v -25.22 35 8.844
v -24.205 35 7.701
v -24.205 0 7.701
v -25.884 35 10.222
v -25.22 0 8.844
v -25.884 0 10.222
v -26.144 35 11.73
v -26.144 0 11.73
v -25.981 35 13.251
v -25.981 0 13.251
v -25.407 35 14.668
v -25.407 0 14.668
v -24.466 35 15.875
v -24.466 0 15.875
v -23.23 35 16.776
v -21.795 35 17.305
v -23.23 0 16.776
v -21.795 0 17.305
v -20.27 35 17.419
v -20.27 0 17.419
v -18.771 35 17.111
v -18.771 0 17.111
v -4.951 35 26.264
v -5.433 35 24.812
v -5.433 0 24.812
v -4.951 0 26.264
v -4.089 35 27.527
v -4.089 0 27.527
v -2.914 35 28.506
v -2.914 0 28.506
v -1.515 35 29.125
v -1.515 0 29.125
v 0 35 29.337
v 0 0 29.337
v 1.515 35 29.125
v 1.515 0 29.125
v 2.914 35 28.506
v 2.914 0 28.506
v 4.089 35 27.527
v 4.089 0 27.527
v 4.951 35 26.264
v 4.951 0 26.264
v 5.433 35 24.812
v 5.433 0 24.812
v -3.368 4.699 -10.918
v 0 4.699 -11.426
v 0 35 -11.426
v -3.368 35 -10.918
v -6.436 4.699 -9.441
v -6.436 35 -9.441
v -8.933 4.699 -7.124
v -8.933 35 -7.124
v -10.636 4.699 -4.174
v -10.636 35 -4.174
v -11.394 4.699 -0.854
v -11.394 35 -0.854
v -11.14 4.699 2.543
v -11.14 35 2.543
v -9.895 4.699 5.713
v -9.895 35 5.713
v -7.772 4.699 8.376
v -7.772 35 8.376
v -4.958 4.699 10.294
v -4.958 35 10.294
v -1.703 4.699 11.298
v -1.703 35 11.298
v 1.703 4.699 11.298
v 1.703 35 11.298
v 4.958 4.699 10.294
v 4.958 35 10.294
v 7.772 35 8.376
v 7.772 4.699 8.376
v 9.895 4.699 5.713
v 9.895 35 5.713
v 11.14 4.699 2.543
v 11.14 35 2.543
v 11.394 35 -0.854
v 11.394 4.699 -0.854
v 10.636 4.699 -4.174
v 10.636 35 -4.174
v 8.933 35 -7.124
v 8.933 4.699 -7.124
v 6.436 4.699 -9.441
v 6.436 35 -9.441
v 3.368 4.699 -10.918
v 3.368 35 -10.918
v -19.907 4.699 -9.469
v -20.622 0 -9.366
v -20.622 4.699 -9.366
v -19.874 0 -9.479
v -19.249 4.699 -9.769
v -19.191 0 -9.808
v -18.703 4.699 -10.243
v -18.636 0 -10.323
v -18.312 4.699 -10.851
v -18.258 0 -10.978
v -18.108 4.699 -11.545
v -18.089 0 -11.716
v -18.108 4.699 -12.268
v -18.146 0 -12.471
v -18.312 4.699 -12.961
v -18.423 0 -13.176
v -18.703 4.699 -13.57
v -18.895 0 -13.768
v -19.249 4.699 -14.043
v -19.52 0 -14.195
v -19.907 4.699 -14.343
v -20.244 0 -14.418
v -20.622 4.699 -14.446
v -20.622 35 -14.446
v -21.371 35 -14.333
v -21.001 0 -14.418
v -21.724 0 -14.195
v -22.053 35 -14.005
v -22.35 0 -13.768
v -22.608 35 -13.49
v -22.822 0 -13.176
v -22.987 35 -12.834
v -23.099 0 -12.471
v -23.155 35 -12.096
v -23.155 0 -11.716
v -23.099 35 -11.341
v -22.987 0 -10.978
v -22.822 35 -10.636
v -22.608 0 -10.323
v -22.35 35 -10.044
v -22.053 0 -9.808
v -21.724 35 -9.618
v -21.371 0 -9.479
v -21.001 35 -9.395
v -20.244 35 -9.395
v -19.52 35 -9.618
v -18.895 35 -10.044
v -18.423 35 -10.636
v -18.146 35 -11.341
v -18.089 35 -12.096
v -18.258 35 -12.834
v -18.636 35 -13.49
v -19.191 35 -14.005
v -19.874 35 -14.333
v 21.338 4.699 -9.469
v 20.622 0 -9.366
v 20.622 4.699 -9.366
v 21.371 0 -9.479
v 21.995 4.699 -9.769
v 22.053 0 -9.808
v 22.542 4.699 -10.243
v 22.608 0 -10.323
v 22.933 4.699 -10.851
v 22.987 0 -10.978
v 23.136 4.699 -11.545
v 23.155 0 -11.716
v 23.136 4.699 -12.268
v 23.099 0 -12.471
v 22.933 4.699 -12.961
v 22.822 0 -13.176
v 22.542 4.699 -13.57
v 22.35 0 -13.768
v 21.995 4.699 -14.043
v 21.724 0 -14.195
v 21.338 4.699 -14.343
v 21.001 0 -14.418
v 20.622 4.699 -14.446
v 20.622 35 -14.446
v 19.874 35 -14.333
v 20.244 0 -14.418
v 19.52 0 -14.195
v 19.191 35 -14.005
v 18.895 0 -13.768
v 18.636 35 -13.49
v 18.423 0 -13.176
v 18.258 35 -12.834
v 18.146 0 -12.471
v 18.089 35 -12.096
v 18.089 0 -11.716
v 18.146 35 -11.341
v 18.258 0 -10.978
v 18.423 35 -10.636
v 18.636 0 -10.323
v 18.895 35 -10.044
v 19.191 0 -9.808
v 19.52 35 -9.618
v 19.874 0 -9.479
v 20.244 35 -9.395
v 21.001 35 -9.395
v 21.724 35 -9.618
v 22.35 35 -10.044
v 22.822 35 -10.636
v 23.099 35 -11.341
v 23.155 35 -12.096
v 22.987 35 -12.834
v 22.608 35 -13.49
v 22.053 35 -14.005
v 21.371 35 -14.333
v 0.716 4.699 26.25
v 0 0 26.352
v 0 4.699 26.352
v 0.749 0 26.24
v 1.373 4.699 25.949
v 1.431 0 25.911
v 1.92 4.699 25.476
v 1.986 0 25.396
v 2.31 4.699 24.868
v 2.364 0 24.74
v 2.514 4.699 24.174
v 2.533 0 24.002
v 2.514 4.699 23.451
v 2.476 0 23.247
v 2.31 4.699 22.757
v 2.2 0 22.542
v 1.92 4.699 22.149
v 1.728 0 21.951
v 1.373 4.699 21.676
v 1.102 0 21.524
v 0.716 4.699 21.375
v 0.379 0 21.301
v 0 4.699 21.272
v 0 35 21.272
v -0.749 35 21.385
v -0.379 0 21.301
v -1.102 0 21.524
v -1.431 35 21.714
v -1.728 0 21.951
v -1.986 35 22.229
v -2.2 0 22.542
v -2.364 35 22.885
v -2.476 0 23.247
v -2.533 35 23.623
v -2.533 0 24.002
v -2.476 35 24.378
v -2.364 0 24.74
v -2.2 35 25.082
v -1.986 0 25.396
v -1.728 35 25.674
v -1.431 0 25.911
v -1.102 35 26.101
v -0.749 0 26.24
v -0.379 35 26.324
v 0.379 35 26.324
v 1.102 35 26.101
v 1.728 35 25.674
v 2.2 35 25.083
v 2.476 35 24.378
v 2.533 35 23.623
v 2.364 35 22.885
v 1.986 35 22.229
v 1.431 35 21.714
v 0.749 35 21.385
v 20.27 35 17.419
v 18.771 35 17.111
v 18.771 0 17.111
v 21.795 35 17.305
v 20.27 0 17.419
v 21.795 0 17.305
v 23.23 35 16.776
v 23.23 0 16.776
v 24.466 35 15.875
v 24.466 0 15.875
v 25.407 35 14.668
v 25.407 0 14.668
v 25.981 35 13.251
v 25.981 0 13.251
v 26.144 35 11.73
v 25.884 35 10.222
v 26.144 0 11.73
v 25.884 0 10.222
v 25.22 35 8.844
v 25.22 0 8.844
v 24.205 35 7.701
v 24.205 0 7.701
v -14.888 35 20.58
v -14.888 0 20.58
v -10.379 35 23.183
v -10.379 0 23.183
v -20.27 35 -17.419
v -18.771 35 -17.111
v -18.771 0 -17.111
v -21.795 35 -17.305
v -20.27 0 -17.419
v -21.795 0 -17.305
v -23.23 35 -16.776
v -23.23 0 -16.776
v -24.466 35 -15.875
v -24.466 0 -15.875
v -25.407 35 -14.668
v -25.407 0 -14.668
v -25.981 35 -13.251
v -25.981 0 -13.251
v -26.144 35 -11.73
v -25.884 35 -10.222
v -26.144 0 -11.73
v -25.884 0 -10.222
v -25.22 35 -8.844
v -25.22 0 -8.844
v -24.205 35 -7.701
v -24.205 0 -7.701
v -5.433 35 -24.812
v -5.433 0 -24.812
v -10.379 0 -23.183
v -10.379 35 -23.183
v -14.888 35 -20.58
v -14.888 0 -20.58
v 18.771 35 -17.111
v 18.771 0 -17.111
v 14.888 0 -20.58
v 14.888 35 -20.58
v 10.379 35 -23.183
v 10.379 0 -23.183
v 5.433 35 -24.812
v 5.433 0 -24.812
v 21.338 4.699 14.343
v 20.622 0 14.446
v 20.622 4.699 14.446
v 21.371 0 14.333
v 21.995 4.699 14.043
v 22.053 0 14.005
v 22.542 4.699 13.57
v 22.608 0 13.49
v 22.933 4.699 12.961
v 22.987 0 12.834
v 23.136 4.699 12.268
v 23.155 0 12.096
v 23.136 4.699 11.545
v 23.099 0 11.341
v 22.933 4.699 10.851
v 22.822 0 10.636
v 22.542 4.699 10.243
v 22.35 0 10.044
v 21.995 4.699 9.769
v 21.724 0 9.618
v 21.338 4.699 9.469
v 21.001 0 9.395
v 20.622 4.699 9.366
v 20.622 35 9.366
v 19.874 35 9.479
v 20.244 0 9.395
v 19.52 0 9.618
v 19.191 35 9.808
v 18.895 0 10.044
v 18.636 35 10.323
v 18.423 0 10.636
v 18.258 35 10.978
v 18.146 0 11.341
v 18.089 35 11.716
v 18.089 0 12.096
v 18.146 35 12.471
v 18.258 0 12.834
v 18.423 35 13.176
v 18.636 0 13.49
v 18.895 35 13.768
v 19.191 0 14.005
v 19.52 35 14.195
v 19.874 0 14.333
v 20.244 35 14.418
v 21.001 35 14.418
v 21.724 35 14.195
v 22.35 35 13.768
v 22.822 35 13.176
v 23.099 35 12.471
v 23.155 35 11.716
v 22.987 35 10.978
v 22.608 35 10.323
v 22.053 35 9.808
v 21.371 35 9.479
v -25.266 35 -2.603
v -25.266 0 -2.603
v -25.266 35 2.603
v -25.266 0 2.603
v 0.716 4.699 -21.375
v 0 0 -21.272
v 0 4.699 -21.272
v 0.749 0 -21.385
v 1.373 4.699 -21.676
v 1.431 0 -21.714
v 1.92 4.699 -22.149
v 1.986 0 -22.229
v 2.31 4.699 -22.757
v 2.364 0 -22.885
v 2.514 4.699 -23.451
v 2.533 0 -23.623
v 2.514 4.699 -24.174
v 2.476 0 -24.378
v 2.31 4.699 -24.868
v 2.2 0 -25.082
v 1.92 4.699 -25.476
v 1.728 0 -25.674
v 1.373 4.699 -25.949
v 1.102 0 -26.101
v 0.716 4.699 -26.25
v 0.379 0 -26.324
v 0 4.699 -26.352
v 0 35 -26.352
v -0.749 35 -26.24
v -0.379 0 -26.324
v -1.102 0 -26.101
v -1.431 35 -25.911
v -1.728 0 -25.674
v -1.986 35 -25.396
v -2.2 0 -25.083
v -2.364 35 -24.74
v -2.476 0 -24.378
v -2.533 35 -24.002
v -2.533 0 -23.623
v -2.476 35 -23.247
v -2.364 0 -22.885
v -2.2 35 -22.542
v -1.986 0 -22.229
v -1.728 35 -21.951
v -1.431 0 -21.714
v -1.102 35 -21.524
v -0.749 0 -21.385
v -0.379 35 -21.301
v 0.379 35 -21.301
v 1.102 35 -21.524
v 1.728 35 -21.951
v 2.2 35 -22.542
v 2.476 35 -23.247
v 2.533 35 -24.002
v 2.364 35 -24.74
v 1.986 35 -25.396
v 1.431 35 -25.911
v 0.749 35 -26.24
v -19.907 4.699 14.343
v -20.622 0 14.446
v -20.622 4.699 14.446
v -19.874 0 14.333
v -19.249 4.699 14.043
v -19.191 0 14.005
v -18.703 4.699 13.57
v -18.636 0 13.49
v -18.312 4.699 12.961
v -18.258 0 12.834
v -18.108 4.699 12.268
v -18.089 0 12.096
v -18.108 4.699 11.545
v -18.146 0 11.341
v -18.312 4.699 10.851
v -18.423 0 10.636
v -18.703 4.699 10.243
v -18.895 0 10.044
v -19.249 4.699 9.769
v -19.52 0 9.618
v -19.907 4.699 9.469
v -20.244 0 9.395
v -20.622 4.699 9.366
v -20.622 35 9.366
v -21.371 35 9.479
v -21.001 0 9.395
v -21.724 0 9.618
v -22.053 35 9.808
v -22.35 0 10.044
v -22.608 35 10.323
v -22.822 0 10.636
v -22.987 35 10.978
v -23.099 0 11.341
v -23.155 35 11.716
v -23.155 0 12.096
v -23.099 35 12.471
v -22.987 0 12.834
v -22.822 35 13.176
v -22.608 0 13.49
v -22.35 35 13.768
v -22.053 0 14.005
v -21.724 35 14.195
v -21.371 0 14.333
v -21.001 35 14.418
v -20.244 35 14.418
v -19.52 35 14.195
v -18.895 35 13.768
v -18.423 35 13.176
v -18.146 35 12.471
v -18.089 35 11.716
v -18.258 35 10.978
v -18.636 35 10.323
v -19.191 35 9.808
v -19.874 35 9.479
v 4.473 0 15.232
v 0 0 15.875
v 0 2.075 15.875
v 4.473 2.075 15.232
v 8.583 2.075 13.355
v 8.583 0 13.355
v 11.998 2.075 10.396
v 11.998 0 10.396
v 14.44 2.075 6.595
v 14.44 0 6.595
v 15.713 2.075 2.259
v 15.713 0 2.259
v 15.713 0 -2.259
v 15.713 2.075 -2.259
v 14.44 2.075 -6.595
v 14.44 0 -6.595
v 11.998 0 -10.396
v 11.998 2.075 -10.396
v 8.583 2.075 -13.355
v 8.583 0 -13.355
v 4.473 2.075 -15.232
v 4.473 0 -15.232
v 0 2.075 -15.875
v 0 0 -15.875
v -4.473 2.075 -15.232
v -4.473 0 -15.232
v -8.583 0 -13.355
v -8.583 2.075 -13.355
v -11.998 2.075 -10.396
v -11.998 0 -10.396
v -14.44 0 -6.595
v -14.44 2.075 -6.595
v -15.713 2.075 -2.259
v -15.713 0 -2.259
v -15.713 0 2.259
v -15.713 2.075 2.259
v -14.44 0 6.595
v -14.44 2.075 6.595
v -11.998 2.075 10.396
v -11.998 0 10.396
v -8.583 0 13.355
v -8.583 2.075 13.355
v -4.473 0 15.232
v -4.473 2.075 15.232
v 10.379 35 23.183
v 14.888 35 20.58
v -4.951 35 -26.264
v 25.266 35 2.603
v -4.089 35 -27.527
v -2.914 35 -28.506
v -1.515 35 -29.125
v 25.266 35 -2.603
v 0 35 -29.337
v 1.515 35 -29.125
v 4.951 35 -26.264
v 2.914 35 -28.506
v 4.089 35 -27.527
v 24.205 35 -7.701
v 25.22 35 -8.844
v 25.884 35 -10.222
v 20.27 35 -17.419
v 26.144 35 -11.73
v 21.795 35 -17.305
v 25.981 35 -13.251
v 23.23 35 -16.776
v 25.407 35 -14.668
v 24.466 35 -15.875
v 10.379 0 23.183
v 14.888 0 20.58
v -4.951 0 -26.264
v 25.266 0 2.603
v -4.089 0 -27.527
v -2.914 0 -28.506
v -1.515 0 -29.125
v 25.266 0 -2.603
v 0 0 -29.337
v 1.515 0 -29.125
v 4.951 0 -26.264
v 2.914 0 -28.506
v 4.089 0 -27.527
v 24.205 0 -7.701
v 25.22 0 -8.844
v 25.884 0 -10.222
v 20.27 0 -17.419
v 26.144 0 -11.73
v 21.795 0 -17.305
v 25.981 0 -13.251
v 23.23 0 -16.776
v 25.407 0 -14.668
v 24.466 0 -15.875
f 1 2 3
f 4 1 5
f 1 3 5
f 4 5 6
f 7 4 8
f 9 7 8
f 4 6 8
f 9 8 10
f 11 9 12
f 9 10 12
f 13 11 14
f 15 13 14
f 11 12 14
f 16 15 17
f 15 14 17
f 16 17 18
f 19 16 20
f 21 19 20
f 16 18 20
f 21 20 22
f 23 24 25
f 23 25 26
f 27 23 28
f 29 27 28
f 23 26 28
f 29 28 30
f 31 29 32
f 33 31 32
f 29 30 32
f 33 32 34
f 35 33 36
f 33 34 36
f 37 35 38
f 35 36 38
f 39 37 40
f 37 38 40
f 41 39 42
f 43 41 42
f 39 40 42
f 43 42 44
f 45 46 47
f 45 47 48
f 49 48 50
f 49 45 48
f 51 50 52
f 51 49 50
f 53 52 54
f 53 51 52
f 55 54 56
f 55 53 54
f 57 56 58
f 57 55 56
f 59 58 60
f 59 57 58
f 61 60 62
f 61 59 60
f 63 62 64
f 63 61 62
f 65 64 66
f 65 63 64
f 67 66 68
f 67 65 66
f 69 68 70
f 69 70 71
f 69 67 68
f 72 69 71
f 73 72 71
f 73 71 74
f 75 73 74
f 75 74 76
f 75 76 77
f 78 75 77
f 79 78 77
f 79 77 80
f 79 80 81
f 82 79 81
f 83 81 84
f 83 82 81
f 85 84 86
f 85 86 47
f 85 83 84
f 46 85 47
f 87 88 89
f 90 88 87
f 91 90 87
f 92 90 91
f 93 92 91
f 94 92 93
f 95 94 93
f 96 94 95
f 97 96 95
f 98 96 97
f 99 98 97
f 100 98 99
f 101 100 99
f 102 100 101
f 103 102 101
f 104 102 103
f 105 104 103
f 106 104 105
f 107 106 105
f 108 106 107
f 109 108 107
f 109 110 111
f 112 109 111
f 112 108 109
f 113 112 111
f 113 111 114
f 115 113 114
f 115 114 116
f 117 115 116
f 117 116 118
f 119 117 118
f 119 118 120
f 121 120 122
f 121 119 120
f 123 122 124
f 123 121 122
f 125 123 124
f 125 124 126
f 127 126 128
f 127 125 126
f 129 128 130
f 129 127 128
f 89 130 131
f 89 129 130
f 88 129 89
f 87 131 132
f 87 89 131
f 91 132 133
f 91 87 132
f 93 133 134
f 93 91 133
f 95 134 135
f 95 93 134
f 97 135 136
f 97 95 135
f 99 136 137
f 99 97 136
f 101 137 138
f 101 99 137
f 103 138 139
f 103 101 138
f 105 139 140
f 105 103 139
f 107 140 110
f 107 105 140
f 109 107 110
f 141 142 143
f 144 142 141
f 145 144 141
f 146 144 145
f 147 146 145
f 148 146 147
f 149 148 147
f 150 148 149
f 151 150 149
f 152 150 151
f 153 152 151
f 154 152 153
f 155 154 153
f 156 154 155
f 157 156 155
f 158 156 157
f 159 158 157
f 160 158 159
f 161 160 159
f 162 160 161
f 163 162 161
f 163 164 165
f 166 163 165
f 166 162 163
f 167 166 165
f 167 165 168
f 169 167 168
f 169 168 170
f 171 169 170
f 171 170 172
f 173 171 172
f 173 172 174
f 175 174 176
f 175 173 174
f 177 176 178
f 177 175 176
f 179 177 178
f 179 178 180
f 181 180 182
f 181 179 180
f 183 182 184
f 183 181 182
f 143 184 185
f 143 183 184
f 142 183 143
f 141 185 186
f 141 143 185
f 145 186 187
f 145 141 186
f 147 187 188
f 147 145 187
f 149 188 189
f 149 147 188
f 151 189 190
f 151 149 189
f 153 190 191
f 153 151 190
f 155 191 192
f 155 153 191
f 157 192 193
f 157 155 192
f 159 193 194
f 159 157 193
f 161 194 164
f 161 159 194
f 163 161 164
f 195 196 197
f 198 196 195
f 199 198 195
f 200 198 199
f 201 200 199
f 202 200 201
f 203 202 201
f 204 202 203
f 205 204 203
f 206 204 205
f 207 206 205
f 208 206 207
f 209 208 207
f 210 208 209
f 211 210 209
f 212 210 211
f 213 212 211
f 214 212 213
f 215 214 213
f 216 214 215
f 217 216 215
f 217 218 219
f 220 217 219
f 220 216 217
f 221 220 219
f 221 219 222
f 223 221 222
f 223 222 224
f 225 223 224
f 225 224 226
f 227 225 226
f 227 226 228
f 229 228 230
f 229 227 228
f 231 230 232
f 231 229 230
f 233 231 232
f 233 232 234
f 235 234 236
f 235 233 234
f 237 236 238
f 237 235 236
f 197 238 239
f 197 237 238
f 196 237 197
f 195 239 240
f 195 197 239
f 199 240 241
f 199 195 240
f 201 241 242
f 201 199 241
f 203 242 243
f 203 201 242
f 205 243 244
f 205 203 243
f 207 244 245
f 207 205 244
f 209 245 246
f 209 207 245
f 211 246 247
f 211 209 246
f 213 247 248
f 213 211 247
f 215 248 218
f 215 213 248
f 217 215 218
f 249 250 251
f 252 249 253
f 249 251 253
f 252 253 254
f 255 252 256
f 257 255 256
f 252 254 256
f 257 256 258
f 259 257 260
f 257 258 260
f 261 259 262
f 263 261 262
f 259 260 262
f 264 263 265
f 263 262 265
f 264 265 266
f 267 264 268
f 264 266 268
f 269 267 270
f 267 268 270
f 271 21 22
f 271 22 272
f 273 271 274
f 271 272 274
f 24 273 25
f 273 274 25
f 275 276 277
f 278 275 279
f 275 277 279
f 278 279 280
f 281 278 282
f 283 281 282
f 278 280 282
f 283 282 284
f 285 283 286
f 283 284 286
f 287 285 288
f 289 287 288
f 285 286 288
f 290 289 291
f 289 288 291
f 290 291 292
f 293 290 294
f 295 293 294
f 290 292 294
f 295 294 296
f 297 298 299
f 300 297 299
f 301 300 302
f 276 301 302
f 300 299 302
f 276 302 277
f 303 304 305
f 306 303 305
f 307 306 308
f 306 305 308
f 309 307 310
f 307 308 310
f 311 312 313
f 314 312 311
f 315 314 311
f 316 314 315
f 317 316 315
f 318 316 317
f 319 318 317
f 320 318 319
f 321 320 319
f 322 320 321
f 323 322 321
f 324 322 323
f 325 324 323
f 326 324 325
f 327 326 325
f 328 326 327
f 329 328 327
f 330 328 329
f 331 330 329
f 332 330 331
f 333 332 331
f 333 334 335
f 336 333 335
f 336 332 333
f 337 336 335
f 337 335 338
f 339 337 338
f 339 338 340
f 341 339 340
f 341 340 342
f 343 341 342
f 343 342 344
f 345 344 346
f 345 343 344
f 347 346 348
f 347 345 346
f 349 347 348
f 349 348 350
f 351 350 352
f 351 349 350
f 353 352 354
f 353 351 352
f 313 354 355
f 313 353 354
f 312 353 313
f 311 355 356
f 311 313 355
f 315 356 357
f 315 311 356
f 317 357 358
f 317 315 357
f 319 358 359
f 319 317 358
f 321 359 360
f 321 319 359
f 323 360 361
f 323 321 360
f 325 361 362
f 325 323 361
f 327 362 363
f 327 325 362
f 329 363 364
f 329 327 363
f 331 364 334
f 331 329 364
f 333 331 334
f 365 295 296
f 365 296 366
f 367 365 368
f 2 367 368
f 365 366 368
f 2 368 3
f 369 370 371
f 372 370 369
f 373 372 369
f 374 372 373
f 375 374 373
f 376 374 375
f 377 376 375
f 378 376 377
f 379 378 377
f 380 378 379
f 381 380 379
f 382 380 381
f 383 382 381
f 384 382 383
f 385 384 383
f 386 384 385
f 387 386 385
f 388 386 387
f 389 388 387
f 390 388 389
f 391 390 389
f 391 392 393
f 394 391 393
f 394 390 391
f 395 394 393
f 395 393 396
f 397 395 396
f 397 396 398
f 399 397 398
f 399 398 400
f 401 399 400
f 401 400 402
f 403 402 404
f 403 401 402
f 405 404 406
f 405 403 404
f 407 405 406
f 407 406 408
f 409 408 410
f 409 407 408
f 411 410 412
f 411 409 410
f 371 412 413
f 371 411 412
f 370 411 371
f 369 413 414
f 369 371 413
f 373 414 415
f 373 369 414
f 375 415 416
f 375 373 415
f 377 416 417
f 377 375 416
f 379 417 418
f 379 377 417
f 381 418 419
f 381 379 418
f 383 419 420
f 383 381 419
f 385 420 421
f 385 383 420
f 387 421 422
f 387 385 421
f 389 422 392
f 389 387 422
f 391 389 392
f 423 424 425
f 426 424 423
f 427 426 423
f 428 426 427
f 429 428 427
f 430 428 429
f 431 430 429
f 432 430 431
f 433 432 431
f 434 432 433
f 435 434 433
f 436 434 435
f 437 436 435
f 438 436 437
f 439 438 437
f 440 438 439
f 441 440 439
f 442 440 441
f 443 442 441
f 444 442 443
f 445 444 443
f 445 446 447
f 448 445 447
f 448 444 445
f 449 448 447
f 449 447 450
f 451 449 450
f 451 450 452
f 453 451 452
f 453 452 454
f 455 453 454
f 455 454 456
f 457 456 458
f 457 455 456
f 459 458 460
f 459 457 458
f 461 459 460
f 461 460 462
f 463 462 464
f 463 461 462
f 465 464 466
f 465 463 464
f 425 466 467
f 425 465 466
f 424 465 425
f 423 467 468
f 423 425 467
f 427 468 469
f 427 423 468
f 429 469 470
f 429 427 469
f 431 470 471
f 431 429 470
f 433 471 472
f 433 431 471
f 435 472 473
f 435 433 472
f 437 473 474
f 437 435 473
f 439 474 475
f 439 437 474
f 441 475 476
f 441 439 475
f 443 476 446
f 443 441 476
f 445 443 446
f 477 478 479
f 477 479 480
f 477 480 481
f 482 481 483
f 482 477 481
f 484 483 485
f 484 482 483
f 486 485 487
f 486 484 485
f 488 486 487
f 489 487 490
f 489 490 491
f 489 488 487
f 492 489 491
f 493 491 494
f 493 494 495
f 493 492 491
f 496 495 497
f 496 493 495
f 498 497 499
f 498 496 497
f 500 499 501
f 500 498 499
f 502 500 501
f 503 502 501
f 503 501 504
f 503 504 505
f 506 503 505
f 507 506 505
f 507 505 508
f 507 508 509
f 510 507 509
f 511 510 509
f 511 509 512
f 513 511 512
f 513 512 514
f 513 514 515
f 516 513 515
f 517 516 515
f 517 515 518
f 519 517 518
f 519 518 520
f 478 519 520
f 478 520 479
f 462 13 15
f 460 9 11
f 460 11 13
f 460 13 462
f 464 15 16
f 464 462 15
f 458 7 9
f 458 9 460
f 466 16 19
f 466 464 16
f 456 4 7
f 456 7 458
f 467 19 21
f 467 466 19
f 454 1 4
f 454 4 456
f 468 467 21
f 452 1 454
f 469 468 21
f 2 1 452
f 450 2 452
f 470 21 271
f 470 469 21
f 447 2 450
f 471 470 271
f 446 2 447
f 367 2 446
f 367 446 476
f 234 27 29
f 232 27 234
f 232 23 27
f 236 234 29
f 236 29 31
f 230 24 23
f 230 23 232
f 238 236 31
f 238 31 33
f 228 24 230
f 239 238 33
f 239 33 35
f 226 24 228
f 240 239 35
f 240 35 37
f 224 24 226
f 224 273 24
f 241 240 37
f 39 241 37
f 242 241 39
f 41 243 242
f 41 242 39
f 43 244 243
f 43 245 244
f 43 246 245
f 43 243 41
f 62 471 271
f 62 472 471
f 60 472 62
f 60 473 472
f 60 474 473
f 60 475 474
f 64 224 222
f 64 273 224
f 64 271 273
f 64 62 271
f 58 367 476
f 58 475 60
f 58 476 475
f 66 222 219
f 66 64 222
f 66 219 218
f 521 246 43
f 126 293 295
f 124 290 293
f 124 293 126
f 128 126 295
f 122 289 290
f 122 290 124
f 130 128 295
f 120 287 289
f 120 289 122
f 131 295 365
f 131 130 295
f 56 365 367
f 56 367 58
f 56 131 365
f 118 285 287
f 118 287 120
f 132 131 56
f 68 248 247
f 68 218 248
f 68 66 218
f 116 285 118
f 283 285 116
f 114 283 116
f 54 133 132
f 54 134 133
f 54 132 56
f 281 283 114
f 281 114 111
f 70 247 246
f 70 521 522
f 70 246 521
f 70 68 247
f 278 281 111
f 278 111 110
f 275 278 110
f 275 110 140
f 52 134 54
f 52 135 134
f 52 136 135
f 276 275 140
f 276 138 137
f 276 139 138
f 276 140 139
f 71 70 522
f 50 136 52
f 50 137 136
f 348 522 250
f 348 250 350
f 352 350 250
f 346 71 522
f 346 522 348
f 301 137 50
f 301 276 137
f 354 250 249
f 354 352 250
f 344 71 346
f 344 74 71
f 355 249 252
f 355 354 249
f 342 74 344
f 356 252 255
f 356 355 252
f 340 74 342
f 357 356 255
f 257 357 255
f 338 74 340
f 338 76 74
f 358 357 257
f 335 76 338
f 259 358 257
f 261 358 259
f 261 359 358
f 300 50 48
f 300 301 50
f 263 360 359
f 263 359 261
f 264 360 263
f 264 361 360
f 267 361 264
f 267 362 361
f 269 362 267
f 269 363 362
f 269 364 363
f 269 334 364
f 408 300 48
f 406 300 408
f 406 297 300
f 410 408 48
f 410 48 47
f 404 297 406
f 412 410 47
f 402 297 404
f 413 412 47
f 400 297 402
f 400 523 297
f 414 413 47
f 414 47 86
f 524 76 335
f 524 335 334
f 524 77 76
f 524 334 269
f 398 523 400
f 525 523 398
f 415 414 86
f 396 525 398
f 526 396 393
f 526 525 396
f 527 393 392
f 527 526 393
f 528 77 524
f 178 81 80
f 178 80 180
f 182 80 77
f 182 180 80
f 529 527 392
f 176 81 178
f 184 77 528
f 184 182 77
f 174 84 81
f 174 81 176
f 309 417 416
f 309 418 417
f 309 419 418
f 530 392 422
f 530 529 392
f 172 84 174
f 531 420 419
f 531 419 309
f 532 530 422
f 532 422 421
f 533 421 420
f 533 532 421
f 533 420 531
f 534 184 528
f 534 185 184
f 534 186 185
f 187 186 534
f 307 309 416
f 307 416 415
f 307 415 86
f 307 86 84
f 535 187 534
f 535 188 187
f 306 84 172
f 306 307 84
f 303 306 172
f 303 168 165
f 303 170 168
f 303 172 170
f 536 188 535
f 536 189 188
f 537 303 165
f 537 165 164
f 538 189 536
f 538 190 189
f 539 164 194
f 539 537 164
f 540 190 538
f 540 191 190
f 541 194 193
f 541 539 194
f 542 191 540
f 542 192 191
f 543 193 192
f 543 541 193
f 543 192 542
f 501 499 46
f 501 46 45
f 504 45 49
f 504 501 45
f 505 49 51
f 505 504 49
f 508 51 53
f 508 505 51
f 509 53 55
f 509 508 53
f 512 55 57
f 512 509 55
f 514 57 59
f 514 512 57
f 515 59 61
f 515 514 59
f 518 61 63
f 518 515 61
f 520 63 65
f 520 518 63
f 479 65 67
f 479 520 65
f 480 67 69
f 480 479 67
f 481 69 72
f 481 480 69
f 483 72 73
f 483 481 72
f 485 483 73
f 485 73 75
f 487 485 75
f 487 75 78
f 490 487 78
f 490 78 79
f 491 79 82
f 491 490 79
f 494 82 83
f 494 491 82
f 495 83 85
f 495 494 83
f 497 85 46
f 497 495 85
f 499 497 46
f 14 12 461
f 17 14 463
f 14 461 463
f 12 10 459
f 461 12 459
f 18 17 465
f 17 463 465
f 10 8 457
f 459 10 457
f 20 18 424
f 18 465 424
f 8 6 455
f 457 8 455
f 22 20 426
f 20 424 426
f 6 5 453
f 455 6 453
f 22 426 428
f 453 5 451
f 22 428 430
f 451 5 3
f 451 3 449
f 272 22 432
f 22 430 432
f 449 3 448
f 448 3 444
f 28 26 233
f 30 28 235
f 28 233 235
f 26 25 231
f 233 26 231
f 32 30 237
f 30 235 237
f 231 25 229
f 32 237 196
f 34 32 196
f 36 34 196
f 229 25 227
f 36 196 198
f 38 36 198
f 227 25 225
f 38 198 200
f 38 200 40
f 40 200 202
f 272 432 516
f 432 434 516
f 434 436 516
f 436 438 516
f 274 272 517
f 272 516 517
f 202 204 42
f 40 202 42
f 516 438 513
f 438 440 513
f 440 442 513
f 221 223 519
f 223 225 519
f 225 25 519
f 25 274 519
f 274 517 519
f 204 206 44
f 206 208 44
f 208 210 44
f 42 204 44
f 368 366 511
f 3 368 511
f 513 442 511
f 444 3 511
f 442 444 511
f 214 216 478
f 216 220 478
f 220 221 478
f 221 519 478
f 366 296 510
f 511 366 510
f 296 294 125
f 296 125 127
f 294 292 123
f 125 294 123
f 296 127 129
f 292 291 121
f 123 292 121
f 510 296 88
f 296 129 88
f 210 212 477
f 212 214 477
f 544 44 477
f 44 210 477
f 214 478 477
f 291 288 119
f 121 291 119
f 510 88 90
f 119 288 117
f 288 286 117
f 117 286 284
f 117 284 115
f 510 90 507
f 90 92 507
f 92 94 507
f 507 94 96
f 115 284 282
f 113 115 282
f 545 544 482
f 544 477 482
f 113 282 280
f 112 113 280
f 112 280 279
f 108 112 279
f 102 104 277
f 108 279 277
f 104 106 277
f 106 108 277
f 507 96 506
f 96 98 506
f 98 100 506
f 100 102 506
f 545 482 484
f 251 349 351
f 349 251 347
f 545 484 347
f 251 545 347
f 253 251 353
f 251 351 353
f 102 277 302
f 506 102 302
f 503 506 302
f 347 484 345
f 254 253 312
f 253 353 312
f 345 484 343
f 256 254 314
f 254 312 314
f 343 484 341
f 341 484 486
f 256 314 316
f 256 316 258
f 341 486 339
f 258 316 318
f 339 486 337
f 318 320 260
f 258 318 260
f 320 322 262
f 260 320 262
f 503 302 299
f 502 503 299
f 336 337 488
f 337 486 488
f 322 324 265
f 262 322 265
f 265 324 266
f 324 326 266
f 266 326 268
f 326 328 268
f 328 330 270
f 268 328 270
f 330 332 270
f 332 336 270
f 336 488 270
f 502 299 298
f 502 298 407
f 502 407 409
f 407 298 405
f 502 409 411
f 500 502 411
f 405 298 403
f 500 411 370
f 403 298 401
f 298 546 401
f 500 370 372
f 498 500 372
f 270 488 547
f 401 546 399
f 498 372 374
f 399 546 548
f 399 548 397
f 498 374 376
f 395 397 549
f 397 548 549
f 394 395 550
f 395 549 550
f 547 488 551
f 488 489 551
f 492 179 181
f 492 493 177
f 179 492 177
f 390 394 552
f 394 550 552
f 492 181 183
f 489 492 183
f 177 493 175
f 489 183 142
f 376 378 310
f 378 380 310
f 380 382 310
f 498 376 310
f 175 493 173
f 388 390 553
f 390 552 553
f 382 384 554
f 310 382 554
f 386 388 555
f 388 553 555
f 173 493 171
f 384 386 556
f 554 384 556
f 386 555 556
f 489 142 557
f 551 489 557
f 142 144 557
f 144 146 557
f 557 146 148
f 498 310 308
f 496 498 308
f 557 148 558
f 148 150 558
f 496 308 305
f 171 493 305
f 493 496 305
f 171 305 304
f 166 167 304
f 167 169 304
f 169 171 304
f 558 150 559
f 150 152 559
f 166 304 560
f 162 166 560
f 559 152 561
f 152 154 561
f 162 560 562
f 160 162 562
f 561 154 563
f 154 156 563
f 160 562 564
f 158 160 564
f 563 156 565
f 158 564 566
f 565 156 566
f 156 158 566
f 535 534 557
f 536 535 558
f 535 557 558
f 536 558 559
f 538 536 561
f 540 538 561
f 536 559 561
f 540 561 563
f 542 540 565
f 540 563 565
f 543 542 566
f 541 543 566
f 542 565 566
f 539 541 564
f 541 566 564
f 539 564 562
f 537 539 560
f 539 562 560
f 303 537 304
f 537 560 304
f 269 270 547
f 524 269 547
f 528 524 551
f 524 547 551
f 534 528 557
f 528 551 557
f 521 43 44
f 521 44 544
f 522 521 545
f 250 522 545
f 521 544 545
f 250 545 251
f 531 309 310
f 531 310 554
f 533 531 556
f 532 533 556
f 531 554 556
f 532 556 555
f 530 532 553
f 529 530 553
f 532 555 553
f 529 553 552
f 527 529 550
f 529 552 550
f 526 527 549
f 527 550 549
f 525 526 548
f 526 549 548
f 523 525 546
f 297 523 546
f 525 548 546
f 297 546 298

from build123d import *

# Parameters (mm, degrees)
SKETCH1_R           = 2.54
SKETCH1_R_2         = 15.875
BOSS_EXTRUDE1_DEPTH = 4.699
SKETCH2_R           = 11.426
SKETCH2_R_2         = 2.54
BOSS_EXTRUDE2_DEPTH = 30.301


with BuildPart() as part:
    # Sketch1 → Boss-Extrude1 (new body)
    with BuildSketch(Plane(origin=(0, 0, 0), x_dir=(1, 0, 0), z_dir=(0, 1, 0))):
        with BuildLine():
            ThreePointArc((-5.433318575, 24.812074667), (-12.7, 21.997045256), (-18.771227695, 17.111429246))
            ThreePointArc((-18.771227695, 17.111429246), (-25.406587271, 14.6685), (-24.204546269, 7.700645421))
            ThreePointArc((-24.204546269, 7.700645421), (-25.4, 0), (-24.204546269, -7.700645421))
            ThreePointArc((-24.204546269, -7.700645421), (-25.406587271, -14.6685), (-18.771227695, -17.111429246))
            ThreePointArc((-18.771227695, -17.111429246), (-12.7, -21.997045256), (-5.433318575, -24.812074667))
            ThreePointArc((-5.433318575, -24.812074667), (0, -29.337), (5.433318575, -24.812074667))
            ThreePointArc((5.433318575, -24.812074667), (12.7, -21.997045256), (18.771227695, -17.111429246))
            ThreePointArc((18.771227695, -17.111429246), (25.406587271, -14.6685), (24.204546269, -7.700645421))
            ThreePointArc((24.204546269, -7.700645421), (25.4, 0), (24.204546269, 7.700645421))
            ThreePointArc((24.204546269, 7.700645421), (25.406587271, 14.6685), (18.771227695, 17.111429246))
            ThreePointArc((18.771227695, 17.111429246), (12.7, 21.997045256), (5.433318575, 24.812074667))
            ThreePointArc((5.433318575, 24.812074667), (0, 29.337), (-5.433318575, 24.812074667))
        make_face()
        with Locations(Location((0, 23.8125, 0), (0, 0, 270))):
            Circle(SKETCH1_R, mode=Mode.SUBTRACT)
        with Locations(Location((20.622229928, 11.90625, 0), (0, 0, 270))):
            Circle(SKETCH1_R, mode=Mode.SUBTRACT)
        with Locations(Location((20.622229928, -11.90625, 0), (0, 0, 270))):
            Circle(SKETCH1_R, mode=Mode.SUBTRACT)
        with Locations(Location((0, -23.8125, 0), (0, 0, 270))):
            Circle(SKETCH1_R, mode=Mode.SUBTRACT)
        with Locations(Location((-20.622229928, -11.90625, 0), (0, 0, 270))):
            Circle(SKETCH1_R, mode=Mode.SUBTRACT)
        with Locations(Location((-20.622229928, 11.90625, 0), (0, 0, 270))):
            Circle(SKETCH1_R, mode=Mode.SUBTRACT)
        with Locations(Location((0, 0, 0), (0, 0, 270))):
            Circle(SKETCH1_R_2, mode=Mode.SUBTRACT)
    extrude(amount=BOSS_EXTRUDE1_DEPTH)

    # Sketch2 → Boss-Extrude2 (add)
    with BuildSketch(Plane(origin=(0, 4.699, 0), x_dir=(1, 0, 0), z_dir=(0, 1, 0))):
        with BuildLine():
            ThreePointArc((-18.771227695, 17.111429246), (-25.406587271, 14.6685), (-24.204546269, 7.700645421))
            ThreePointArc((-24.204546269, 7.700645421), (-25.4, 0), (-24.204546269, -7.700645421))
            ThreePointArc((-24.204546269, -7.700645421), (-25.406587271, -14.6685), (-18.771227695, -17.111429246))
            ThreePointArc((-18.771227695, -17.111429246), (-12.7, -21.997045256), (-5.433318575, -24.812074667))
            ThreePointArc((-5.433318575, -24.812074667), (0, -29.337), (5.433318575, -24.812074667))
            ThreePointArc((5.433318575, -24.812074667), (12.7, -21.997045256), (18.771227695, -17.111429246))
            ThreePointArc((18.771227695, -17.111429246), (25.406587271, -14.6685), (24.204546269, -7.700645421))
            ThreePointArc((24.204546269, -7.700645421), (25.4, 0), (24.204546269, 7.700645421))
            ThreePointArc((24.204546269, 7.700645421), (25.406587271, 14.6685), (18.771227695, 17.111429246))
            ThreePointArc((18.771227695, 17.111429246), (12.7, 21.997045256), (5.433318575, 24.812074667))
            ThreePointArc((5.433318575, 24.812074667), (0, 29.337), (-5.433318575, 24.812074667))
            ThreePointArc((-5.433318575, 24.812074667), (-12.7, 21.997045256), (-18.771227695, 17.111429246))
        make_face()
        with Locations(Location((0, 0, 0), (0, 0, 90))):
            Circle(SKETCH2_R, mode=Mode.SUBTRACT)
        with Locations(Location((20.622229928, -11.90625, 0), (0, 0, 90))):
            Circle(SKETCH2_R_2, mode=Mode.SUBTRACT)
        with Locations(Location((20.622229928, 11.90625, 0), (0, 0, 90))):
            Circle(SKETCH2_R_2, mode=Mode.SUBTRACT)
        with Locations(Location((0, 23.8125, 0), (0, 0, 90))):
            Circle(SKETCH2_R_2, mode=Mode.SUBTRACT)
        with Locations(Location((-20.622229928, 11.90625, 0), (0, 0, 90))):
            Circle(SKETCH2_R_2, mode=Mode.SUBTRACT)
        with Locations(Location((-20.622229928, -11.90625, 0), (0, 0, 90))):
            Circle(SKETCH2_R_2, mode=Mode.SUBTRACT)
        with Locations(Location((0, -23.8125, 0), (0, 0, 90))):
            Circle(SKETCH2_R_2, mode=Mode.SUBTRACT)
    extrude(amount=BOSS_EXTRUDE2_DEPTH)

    # Sketch3 → Revolve1 (revolve)
    with BuildSketch(Plane.XY, mode=Mode.PRIVATE) as revolve1_sk:
        Polygon((18.415, 2.0748), (18.415, 4.699), (11.426, 4.699), (15.875, 2.0748), align=None)
    revolve(revolve1_sk.sketch.rotate(Axis((0, -0.263075, 0), (0, 1, 0)), 90), axis=Axis((0, -0.263075, 0), (0, 1, 0)))


solid = part.part
